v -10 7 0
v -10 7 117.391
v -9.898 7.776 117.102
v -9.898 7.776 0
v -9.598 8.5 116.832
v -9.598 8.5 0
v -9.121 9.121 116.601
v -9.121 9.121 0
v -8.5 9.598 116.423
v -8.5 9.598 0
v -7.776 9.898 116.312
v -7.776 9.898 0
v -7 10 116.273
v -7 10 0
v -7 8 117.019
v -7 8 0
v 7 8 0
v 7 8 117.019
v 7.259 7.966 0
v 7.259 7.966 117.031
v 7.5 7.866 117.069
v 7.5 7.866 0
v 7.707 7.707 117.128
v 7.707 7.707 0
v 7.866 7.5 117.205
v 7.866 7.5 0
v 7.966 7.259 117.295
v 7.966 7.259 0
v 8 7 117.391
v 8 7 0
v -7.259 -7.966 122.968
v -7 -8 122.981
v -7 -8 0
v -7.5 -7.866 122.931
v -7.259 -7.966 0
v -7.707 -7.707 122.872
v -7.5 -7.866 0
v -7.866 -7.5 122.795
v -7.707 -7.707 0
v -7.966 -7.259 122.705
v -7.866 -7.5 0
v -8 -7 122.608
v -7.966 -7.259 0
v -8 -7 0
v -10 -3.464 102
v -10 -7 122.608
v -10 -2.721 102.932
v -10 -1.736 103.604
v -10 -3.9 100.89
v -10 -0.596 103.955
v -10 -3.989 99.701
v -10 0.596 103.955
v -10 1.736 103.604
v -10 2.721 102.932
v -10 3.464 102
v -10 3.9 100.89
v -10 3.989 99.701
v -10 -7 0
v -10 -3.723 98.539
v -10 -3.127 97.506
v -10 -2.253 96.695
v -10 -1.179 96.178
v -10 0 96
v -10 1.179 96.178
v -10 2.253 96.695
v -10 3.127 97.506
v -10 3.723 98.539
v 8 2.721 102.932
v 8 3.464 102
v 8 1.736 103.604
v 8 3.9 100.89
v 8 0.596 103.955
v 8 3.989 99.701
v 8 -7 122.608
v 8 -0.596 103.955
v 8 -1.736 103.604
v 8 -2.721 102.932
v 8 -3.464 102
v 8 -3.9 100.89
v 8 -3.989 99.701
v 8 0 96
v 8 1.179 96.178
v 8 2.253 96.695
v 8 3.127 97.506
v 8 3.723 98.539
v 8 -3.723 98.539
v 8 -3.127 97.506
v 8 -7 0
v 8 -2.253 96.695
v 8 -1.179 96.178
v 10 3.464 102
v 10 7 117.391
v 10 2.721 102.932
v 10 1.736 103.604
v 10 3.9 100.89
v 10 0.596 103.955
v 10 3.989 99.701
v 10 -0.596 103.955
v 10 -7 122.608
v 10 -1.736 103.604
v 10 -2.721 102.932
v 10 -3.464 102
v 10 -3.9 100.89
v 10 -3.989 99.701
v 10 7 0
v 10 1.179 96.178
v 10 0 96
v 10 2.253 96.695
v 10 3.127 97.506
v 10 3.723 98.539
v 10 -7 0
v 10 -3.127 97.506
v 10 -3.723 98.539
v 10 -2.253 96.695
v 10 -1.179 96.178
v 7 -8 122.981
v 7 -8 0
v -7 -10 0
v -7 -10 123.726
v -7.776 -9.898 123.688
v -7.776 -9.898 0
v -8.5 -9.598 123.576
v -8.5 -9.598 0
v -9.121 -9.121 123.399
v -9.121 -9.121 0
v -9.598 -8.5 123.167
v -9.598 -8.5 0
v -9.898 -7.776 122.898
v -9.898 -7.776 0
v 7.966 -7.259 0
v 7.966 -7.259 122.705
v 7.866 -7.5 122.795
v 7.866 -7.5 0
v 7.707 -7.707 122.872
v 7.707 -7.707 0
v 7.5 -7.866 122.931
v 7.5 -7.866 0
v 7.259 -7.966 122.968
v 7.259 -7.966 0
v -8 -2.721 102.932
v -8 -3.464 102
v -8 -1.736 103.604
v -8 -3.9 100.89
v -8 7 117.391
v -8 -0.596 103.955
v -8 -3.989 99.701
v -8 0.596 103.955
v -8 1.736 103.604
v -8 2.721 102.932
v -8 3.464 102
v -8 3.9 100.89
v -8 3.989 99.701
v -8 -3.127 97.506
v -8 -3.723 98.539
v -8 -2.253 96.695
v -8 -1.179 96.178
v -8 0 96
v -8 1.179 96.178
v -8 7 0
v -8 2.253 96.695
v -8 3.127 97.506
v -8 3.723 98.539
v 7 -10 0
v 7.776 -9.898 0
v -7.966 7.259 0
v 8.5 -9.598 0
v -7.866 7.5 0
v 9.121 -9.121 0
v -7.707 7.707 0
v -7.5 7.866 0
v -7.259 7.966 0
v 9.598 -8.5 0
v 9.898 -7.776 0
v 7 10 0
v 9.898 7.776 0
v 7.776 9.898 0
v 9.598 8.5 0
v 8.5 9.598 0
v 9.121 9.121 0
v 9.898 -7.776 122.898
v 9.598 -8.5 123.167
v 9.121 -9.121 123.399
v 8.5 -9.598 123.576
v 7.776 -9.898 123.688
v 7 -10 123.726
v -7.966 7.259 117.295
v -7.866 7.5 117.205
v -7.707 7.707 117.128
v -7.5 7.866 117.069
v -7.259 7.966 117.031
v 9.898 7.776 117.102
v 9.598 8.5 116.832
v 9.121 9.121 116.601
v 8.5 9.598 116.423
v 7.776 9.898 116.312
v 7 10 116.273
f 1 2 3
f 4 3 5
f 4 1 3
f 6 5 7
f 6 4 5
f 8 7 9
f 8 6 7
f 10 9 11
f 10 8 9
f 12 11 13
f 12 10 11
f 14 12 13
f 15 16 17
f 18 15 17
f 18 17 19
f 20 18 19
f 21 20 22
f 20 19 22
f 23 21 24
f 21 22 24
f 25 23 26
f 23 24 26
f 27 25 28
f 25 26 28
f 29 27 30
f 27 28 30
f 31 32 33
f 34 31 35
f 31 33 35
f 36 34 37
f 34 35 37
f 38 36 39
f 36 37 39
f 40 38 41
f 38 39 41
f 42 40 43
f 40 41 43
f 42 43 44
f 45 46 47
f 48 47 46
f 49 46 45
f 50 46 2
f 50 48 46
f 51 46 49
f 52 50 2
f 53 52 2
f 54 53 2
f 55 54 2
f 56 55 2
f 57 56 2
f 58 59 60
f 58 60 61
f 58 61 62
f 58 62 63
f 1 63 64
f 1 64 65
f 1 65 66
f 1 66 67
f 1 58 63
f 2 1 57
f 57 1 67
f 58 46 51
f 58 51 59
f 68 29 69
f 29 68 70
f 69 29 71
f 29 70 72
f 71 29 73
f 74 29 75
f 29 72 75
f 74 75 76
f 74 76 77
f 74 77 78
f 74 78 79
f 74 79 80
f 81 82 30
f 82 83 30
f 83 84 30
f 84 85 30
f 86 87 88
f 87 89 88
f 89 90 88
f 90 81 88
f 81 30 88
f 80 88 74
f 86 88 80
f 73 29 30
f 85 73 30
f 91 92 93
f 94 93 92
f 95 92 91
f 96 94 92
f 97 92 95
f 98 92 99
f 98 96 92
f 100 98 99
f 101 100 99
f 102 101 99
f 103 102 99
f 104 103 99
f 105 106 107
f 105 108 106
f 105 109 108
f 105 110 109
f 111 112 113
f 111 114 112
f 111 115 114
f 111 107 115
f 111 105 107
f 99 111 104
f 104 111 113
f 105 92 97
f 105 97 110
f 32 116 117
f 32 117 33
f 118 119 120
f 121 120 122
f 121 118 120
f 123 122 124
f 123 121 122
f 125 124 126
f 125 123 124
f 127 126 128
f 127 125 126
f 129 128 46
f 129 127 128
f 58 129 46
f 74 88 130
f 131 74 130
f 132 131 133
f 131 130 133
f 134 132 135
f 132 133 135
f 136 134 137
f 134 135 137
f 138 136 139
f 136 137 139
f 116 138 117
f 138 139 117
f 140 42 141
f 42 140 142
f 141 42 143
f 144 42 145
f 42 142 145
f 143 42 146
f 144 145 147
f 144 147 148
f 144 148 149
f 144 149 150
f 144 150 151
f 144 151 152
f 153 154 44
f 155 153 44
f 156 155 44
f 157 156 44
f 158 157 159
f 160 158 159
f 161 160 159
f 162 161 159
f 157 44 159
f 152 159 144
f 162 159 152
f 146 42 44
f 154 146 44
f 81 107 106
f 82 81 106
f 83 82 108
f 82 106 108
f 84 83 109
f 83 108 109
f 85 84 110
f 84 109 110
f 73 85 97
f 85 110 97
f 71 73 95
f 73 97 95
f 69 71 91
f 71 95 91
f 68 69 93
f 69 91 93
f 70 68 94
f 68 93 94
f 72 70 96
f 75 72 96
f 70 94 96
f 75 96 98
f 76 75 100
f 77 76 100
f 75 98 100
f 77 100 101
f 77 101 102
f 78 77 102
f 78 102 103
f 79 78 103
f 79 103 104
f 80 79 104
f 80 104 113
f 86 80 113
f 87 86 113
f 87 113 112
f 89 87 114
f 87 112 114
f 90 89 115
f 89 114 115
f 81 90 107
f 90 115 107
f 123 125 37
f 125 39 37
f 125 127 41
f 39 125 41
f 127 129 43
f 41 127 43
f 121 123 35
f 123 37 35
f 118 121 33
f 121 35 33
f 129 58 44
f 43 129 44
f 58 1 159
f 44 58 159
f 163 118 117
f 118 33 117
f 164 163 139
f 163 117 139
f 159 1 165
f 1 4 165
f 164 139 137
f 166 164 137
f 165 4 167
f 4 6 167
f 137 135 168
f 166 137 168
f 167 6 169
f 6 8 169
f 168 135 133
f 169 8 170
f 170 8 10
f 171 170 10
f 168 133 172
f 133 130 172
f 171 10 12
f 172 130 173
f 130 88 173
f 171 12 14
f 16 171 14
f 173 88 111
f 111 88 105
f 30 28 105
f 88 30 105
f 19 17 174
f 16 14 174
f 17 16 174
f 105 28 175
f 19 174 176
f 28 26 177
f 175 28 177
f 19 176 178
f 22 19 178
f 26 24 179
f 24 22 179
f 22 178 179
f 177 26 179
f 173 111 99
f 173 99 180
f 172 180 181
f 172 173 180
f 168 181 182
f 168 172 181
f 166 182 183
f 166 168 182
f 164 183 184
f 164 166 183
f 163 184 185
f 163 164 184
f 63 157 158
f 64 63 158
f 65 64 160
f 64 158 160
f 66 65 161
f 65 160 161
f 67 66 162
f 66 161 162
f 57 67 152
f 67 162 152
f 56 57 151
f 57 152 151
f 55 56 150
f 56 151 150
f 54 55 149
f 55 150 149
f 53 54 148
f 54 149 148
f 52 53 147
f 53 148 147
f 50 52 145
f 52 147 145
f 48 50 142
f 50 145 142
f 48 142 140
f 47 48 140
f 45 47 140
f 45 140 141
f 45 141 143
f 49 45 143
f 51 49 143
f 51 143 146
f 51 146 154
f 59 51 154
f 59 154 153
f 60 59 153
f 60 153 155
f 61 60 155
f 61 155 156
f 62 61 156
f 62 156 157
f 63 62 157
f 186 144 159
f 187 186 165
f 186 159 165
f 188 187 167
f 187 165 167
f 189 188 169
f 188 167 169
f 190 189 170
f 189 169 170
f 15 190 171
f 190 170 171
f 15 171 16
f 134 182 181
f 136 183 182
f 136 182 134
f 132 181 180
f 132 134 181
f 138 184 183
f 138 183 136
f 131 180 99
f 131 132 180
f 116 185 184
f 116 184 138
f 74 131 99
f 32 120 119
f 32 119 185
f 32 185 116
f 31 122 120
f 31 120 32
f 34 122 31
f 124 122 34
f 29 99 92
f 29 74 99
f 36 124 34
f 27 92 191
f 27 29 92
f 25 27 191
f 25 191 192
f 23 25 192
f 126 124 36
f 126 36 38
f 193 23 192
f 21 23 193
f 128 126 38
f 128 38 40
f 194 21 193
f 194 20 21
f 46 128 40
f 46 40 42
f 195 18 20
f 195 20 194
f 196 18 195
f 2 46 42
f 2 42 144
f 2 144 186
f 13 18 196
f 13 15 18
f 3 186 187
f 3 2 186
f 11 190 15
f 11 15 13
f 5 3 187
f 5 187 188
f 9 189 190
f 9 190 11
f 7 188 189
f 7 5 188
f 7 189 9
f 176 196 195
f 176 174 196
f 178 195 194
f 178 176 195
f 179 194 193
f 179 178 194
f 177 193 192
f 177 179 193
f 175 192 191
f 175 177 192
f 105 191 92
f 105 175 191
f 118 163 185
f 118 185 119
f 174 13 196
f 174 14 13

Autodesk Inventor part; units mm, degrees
ref_plane "Start Plane" through (0, 0, 0) normal (0, 0, 1) x (1, 0, 0)
ref_plane "End Plane" through (0, 0, 123.7262) normal (0, 0, 1) x (1, 0, 0)
sketch "Sketch" plane through (0, 0, 0) normal (0, 0, 1) x (1, 0, 0)
  line L0 (-10, -7) -> (-10, 7)
  line L1 (-7, 10) -> (7, 10)
  line L2 (10, 7) -> (10, -7)
  line L3 (7, -10) -> (-7, -10)
  arc A0 (-10, -7) -> (-7, -10) centre (-7, -7) ccw
  arc A1 (-7, 10) -> (-10, 7) centre (-7, 7) ccw
  arc A2 (10, 7) -> (7, 10) centre (7, 7) ccw
  arc A3 (7, -10) -> (10, -7) centre (7, -7) ccw
  arc A4 (-7, 8) -> (-8, 7) centre (-7, 7) ccw
  line L4 (-7, 8) -> (7, 8)
  arc A5 (8, 7) -> (7, 8) centre (7, 7) ccw
  line L5 (8, 7) -> (8, -7)
  arc A6 (7, -8) -> (8, -7) centre (7, -7) ccw
  line L6 (7, -8) -> (-7, -8)
  arc A7 (-8, -7) -> (-7, -8) centre (-7, -7) ccw
  line L7 (-8, -7) -> (-8, 7)
  line L8 (0, 14.8698) -> (0, -14.8698) construction
  line L9 (-14.8698, 0) -> (14.8698, 0) construction
  dimension "d7" = 3
  dimension "d10" = 20
  dimension "d11" = 20
  dimension "d12" = 2
  dimension "d15" = 10
  dimension "d16" = 10
extrude "Body" add sketch "Sketch" along normal up to surface (123.7262 mm away) from surface at 0
sketch "Sketch3" plane through (0, 0, 0) normal (0, 0, 1) x (1, 0, 0)
  line L0 (0, 0) -> (10, 0)
ref_plane "Work Plane3" through (0, 0, 0) normal (0, -1, 0) x (1, 0, 0)
sketch "Sketch4" plane through (0, 0, 0) normal (0, -1, 0) x (1, 0, 0)
  line L0 (-2, 0) -> (12, 0)
  line L1 (-2, 123.7262) -> (12, 123.7262)
  dimension "d18" = 123.7262
ref_plane "Work Plane5" through (0, -10, 123.7262) normal (0, 0.3492, 0.9371) x (1, 0, 0)
split "Split2" plane through (0, -10, 123.7262) removes the side toward (0, 0.3492, 0.9371)
sketch "Sketch5" plane through (10, -7, 0) normal (1, 0, 0) x (0, 0, -1)
  circle A0 centre (-100, 7) radius 4 projected
  line L0 (0, 0) -> (-122.6083, 0) projected
  line L1 (0, 14) -> (0, 0) projected
  line L2 (0, 14) -> (-117.3917, 14) projected
  line L3 (-117.3917, 14) -> (-122.6083, 0) projected
  point P0 (0, 7)
extrude "Extrusion2" cut sketch "Sketch5" against normal through all contours A0
equation "\"d7\" = G_IR"
equation "\"d10\" = G_H"
equation "\"d11\" = G_W"
equation "\"d12\" = G_T"
equation "\"d15\" = 0.5 * d10"
equation "\"d16\" = 0.5 * d11"
equation "\"d3\" = G_L"
equation "\"G_W\" = 20"
equation "\"G_H\" = 20"
equation "\"G_T\" = 2"
equation "\"G_IR\" = 3"
equation "\"G_L\" = d18"
equation "\"G_OFFSET_START\" = 0"
equation "\"G_OFFSET_END\" = 3.72616"
equation "\"d14\" = G_OFFSET_END + B_L"
equation "\"B_L\" = 120"
properties part number "ISO 12633-2 - 20x20x2 - 123,73" material "Steel, Mild"
